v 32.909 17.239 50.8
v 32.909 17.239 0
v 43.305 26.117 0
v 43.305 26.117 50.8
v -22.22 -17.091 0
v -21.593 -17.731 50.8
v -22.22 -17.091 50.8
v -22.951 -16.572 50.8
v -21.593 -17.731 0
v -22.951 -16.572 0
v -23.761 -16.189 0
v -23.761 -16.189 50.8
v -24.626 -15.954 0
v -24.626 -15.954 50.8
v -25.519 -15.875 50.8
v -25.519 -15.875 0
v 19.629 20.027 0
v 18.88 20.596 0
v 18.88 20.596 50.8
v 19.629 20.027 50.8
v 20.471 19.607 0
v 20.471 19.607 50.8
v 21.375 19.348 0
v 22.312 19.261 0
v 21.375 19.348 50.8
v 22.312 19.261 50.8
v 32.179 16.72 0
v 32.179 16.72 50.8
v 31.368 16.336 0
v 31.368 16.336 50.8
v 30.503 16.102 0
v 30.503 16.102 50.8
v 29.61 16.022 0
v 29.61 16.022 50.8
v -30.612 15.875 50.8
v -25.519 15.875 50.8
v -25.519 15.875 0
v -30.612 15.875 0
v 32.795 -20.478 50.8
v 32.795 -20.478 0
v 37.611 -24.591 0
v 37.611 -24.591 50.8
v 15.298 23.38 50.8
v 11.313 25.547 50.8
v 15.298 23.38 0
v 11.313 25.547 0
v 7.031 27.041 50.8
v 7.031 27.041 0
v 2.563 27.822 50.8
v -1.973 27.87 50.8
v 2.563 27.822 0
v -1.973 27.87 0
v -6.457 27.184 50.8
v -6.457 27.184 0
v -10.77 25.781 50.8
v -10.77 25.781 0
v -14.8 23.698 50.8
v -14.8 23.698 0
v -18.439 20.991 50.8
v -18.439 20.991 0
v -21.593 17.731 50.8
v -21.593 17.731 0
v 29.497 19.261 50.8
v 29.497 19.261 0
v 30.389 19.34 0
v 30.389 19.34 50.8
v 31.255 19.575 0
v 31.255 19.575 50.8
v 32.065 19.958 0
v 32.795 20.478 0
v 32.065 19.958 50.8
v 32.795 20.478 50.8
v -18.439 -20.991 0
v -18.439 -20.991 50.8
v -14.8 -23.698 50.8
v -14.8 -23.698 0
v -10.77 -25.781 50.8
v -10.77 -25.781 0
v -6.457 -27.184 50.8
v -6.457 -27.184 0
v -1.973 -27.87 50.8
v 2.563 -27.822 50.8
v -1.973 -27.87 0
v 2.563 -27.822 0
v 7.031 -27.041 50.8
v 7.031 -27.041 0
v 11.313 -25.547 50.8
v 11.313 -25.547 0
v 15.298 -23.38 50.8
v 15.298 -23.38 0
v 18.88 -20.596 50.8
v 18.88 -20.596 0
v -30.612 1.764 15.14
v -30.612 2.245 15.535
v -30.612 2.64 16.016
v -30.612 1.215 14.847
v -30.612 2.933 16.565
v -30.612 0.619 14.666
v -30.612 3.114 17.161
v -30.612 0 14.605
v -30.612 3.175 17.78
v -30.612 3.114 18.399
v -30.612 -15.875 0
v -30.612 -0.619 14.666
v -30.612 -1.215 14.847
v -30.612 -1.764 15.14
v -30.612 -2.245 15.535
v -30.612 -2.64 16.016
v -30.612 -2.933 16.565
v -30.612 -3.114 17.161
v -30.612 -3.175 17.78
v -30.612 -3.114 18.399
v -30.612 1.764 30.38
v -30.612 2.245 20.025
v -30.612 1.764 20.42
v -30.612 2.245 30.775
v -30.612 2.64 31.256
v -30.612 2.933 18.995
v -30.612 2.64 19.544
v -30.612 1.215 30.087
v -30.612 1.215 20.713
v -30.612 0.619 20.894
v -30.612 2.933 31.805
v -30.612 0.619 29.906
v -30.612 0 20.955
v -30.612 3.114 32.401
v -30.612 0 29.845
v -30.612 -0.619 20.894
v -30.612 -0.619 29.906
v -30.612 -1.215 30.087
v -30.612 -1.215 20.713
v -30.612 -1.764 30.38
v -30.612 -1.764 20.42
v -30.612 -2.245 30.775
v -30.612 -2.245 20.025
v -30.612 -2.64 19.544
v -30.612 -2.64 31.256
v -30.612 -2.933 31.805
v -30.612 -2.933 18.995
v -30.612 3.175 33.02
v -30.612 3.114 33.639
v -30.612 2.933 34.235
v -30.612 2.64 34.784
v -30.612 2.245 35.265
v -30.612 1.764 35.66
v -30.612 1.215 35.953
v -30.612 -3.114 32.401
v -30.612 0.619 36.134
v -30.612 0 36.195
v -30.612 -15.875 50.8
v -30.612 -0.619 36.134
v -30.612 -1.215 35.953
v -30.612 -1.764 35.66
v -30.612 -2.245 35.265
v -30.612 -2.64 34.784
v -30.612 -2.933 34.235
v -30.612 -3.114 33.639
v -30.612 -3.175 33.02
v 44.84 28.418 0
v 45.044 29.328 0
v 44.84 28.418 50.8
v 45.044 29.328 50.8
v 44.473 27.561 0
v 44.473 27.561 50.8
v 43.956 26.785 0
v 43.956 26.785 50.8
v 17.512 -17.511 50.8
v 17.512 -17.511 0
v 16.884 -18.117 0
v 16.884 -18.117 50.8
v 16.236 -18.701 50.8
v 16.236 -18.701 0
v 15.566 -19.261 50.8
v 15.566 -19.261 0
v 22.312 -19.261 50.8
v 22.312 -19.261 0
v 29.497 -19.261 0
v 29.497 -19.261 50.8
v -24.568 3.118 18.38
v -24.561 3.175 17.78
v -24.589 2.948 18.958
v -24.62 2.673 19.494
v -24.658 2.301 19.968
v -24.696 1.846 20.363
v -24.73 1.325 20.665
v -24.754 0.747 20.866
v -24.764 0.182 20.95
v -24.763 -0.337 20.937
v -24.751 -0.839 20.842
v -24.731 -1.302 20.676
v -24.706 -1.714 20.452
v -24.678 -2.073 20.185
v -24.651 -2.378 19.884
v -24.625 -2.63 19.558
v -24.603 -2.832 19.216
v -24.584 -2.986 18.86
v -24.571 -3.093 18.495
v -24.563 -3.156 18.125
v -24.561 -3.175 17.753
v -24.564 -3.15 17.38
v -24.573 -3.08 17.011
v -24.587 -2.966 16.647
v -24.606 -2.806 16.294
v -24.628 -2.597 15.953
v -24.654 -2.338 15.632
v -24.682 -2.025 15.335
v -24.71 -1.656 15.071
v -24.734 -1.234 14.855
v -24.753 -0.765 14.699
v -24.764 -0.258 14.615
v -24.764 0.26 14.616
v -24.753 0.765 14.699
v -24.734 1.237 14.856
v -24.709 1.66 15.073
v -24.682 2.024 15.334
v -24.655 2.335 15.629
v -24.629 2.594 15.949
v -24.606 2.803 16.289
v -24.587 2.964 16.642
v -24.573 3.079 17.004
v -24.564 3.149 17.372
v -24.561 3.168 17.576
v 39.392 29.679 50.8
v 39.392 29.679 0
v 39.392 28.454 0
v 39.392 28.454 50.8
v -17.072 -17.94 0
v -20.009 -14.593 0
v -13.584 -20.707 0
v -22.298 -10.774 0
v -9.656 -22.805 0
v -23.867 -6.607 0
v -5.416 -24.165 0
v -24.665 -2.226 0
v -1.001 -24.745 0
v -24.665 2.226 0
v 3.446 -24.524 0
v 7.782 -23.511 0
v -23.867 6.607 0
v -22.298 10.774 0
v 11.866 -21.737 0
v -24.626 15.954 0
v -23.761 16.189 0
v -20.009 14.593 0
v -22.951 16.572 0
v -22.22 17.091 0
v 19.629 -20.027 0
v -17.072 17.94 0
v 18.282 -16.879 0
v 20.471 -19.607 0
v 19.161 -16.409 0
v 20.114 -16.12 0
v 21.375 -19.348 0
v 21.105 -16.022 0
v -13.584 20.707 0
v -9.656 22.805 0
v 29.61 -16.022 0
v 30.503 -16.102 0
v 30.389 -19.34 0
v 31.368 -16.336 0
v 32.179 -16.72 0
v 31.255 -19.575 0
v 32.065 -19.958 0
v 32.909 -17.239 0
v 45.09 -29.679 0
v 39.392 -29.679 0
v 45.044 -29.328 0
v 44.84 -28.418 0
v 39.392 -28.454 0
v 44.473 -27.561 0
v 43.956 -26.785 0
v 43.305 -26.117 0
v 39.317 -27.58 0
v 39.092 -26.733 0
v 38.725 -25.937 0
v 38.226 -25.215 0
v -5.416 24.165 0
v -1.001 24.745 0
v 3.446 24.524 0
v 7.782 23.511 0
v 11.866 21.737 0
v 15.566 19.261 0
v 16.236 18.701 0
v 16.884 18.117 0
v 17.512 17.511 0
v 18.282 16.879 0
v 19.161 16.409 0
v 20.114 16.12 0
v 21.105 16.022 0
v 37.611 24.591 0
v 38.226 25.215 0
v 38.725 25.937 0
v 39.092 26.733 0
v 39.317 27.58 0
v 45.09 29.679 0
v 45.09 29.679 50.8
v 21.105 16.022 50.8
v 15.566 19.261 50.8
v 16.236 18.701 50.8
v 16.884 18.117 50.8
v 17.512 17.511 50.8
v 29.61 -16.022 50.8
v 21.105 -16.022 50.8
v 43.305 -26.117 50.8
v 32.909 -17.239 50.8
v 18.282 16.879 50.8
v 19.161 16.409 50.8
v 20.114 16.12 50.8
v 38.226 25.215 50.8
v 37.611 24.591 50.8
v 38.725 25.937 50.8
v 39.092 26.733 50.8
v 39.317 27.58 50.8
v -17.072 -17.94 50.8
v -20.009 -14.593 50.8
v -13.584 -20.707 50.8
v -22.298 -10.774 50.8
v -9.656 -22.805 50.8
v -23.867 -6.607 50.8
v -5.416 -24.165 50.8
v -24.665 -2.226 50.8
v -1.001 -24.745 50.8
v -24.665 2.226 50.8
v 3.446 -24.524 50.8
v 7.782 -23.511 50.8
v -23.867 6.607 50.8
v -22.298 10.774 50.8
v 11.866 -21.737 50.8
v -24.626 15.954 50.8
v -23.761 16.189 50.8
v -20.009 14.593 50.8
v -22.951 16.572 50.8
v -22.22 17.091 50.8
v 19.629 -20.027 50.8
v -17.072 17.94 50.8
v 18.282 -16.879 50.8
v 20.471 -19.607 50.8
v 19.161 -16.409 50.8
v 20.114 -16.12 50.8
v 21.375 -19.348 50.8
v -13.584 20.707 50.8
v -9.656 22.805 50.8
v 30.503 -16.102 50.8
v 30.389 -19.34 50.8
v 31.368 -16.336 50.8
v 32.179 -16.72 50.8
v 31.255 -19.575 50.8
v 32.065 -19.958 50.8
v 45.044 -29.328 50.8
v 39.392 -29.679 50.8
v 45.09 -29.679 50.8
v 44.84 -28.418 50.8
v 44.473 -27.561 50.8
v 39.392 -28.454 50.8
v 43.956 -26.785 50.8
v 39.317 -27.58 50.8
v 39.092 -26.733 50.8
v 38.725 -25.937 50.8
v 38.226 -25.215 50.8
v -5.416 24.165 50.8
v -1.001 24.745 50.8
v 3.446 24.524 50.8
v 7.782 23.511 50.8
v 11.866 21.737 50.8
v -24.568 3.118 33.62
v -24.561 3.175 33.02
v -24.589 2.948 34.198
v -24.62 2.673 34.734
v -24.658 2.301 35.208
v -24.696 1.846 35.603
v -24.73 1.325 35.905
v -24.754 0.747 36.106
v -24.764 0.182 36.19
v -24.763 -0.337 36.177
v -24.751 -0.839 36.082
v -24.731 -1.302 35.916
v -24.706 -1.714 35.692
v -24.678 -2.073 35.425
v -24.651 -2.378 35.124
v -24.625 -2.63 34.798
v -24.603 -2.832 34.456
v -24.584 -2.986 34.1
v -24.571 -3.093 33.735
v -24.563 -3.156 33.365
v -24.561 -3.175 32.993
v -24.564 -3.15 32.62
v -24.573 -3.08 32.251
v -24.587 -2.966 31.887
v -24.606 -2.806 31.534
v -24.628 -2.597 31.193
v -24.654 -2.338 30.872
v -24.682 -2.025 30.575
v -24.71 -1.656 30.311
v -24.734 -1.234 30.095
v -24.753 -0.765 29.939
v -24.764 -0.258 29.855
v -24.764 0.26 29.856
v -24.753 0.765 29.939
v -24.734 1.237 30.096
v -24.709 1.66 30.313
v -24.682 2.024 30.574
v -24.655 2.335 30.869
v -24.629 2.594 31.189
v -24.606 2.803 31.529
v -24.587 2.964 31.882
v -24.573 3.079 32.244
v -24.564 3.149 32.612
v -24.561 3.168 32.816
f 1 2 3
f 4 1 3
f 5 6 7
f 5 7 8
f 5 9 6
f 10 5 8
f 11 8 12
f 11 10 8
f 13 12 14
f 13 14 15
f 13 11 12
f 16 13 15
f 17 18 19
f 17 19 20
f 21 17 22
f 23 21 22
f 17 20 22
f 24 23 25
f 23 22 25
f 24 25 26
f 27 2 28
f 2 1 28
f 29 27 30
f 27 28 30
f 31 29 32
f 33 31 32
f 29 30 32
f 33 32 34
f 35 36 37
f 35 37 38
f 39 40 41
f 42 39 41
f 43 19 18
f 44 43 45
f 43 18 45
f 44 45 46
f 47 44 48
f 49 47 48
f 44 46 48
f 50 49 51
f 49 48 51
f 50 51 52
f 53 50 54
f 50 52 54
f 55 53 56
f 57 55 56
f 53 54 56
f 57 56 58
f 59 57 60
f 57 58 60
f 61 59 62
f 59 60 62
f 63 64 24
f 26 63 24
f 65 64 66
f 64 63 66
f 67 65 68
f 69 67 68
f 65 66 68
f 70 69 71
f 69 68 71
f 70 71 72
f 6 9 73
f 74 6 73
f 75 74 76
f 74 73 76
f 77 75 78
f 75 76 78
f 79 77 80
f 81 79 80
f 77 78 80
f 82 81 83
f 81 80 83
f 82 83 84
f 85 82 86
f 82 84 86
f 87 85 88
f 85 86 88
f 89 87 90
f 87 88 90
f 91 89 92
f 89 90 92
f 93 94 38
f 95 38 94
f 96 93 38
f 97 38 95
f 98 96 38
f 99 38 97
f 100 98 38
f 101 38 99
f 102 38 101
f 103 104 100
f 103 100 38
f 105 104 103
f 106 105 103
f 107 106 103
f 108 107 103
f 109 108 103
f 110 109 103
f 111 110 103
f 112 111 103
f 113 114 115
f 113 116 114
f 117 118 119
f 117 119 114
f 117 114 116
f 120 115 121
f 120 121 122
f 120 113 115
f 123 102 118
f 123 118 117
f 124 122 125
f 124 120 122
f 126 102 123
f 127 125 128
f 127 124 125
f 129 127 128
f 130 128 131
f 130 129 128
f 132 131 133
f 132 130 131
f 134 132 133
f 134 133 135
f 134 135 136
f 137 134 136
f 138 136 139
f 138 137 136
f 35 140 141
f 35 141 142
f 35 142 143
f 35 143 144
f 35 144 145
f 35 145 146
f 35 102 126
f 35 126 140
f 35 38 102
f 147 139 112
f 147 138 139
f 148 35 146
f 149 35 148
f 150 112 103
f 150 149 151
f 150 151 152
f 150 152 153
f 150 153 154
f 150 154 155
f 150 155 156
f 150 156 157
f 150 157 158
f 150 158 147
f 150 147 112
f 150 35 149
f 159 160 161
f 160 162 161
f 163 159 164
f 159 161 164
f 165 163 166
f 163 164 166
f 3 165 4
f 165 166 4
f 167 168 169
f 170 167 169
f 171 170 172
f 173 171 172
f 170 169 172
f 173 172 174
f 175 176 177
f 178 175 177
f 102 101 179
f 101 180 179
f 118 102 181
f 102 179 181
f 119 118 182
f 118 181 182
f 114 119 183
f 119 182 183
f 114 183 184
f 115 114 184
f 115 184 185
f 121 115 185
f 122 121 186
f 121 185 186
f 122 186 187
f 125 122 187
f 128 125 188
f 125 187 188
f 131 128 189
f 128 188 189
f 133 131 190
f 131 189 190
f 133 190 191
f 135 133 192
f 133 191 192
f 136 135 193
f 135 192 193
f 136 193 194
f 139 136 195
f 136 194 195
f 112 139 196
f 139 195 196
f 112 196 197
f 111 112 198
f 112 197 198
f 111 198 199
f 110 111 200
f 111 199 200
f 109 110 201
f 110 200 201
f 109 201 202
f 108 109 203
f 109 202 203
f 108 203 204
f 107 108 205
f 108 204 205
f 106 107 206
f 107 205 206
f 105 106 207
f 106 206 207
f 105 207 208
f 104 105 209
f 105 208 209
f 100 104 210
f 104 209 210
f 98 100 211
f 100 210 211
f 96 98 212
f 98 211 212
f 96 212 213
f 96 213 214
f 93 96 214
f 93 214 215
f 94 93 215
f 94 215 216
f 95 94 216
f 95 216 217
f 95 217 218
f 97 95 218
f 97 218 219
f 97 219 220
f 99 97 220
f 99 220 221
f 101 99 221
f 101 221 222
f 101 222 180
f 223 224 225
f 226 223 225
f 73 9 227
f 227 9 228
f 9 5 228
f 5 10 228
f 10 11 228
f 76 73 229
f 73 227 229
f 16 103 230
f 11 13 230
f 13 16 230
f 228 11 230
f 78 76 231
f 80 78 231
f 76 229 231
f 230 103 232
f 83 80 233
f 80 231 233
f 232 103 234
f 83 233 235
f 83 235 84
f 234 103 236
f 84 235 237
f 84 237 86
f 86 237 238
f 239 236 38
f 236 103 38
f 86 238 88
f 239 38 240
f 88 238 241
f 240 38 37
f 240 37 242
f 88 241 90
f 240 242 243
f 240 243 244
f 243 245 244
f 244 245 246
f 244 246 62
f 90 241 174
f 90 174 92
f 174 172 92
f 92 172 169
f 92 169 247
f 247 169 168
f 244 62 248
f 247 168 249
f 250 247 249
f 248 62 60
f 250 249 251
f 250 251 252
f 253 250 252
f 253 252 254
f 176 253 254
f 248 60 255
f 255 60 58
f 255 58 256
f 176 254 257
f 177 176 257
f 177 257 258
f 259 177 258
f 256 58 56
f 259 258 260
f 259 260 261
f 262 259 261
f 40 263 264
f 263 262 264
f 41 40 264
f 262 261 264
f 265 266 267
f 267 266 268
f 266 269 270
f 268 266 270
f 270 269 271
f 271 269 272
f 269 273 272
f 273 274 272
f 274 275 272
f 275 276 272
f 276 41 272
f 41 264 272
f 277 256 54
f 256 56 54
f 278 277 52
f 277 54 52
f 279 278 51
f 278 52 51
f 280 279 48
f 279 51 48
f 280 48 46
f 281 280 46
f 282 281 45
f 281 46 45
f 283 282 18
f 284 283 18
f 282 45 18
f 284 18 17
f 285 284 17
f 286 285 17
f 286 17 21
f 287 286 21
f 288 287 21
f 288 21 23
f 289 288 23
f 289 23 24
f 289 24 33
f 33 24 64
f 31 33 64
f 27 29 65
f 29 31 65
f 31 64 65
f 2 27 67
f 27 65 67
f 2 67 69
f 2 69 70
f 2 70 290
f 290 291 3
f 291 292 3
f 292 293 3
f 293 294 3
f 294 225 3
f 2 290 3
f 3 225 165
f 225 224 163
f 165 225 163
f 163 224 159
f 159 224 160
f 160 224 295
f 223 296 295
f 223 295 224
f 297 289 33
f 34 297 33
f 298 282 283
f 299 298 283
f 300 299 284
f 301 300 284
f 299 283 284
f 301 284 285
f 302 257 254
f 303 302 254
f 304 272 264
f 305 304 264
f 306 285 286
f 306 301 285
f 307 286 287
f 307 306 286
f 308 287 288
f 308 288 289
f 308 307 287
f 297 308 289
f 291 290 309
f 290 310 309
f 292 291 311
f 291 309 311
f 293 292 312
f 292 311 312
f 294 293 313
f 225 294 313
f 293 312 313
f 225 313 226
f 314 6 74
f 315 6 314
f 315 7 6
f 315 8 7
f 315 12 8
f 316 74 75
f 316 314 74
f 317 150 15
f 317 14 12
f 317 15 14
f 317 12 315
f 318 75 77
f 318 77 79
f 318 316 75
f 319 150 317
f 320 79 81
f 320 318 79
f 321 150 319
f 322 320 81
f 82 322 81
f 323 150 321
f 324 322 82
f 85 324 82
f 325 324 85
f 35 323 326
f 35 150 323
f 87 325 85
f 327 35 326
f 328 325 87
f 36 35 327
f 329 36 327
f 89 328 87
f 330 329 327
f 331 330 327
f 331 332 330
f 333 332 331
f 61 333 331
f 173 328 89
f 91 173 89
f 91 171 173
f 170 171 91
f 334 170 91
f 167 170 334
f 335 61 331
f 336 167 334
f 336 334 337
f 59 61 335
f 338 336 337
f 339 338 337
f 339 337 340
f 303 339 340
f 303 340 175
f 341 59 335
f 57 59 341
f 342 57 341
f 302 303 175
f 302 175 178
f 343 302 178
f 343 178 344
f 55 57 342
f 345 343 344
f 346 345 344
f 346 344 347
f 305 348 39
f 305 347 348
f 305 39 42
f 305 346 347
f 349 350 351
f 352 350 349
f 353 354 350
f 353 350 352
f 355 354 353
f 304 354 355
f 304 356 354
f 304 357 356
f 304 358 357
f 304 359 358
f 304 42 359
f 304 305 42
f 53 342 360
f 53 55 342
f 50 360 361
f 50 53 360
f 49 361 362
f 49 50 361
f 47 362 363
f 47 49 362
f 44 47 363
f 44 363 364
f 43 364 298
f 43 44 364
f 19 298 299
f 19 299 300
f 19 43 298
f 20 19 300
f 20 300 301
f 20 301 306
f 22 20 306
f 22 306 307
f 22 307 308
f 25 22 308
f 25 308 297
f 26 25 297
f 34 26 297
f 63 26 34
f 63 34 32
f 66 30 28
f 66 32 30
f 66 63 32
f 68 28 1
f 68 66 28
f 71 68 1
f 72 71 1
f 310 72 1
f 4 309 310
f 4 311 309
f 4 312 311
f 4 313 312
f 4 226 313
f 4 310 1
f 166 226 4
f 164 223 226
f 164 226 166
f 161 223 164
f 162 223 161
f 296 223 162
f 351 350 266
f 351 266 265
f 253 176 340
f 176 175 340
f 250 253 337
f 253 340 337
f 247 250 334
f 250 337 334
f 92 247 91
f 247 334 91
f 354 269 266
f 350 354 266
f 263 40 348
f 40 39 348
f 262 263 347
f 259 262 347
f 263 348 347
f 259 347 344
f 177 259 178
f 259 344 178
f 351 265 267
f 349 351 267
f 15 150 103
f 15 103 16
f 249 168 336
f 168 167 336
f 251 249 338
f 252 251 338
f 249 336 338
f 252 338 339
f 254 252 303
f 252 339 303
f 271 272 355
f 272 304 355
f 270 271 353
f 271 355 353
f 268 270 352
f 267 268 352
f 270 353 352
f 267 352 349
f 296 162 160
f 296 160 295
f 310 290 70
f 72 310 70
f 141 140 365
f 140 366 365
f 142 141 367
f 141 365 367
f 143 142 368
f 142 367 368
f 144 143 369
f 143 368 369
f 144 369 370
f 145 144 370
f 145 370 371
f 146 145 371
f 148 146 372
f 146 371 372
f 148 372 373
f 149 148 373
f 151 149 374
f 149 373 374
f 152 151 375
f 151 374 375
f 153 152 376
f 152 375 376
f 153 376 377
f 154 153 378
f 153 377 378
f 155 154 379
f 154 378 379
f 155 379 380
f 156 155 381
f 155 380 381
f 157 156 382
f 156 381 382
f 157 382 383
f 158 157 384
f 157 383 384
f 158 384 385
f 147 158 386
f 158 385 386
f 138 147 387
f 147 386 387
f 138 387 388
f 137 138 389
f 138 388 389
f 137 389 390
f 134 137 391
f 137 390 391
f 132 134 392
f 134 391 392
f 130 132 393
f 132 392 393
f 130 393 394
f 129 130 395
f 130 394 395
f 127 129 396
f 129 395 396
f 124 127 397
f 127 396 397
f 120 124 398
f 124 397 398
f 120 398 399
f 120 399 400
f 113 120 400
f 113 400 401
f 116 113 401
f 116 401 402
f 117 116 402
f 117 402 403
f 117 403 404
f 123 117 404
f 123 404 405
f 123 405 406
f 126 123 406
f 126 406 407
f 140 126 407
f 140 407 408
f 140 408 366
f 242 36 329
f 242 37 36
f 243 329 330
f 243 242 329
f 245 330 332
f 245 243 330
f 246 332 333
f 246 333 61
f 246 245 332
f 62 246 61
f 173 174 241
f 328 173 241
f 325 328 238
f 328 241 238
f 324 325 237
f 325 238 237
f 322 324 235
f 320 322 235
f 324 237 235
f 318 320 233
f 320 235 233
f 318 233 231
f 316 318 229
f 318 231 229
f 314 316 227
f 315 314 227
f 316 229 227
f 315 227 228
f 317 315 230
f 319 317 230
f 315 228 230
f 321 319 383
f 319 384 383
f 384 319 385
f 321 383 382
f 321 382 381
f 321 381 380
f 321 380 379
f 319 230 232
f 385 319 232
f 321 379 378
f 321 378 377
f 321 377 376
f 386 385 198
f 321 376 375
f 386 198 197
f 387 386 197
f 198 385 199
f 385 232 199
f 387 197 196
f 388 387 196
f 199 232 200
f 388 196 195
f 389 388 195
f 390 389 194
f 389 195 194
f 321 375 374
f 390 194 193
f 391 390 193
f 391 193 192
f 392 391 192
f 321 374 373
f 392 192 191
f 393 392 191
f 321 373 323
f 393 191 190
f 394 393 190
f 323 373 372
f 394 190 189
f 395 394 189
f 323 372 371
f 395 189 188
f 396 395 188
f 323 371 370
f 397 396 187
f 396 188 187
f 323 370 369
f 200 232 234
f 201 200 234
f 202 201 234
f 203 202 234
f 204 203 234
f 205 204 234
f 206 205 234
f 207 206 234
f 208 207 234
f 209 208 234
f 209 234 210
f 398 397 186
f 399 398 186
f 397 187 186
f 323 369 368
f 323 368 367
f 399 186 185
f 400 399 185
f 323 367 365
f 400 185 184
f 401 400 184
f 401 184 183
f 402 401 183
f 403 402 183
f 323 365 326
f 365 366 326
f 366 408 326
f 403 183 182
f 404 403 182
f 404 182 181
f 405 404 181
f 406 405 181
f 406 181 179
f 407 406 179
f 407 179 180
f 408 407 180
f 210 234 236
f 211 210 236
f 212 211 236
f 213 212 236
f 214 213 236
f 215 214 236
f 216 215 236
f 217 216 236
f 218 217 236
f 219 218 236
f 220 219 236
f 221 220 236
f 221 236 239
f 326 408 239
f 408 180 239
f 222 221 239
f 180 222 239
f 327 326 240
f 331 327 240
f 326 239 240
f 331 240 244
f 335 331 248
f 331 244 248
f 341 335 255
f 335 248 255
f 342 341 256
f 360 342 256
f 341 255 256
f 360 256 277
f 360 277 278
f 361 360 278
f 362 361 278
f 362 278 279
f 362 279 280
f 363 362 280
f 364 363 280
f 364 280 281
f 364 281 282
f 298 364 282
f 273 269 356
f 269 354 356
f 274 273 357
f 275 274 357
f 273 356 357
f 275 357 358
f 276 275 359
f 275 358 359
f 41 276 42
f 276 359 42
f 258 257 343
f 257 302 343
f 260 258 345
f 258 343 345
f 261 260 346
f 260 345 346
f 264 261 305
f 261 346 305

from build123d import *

# Parameters (mm, degrees)
F1_DEPTH = 50.8
F2_R     = 3.175
F3_DEPTH = 127
F5_DEPTH = 50.8
F6_DEPTH = 279.4
F7_R     = 5.08


with BuildPart() as f1:
    # F0 (on Top) → F1 (new body)
    with BuildSketch(Plane.XY):
        with BuildLine():
            ThreePointArc((20.2399183732, 19.2610826343), (21.625356316, 17.6914545532), (22.8893718502, 16.0224922001))
            Line((22.8893718502, 16.0224922001), (31.4840450883, 16.0224922001))
            Line((31.4840450883, 16.0224922001), (44.7927798103, 27.3874809633))
            Line((44.7927798103, 27.3874809633), (45.0897253182, 29.6793562902))
            Line((45.0897253182, 29.6793562902), (39.3924824893, 29.6793562902))
            Line((39.3924824893, 29.6793562902), (39.3924824893, 26.1115133762))
            Line((39.3924824893, 26.1115133762), (31.3704274416, 19.2610826343))
            Line((31.3704274416, 19.2610826343), (20.2399183732, 19.2610826343))
        make_face()
        with BuildLine():
            Line((31.4840450883, -16.0224922001), (22.8893718502, -16.0224922001))
            ThreePointArc((22.8893718502, -16.0224922001), (21.625356316, -17.6914545532), (20.2399183732, -19.2610826343))
            Line((20.2399183732, -19.2610826343), (31.3704274416, -19.2610826343))
            Line((31.3704274416, -19.2610826343), (39.3924824893, -26.1115133762))
            Line((39.3924824893, -26.1115133762), (39.3924824893, -29.6793562902))
            Line((39.3924824893, -29.6793562902), (45.0897253182, -29.6793562902))
            Line((45.0897253182, -29.6793562902), (44.7927798103, -27.3874809633))
            Line((44.7927798103, -27.3874809633), (31.4840450883, -16.0224922001))
        make_face()
        with BuildLine():
            ThreePointArc((15.5664999519, -19.2610826343), (-24.765, 0), (15.5664999519, 19.2610826343))
            Line((15.5664999519, 19.2610826343), (20.2399183732, 19.2610826343))
            ThreePointArc((20.2399183732, 19.2610826343), (-27.94, 0), (20.2399183732, -19.2610826343))
            Line((20.2399183732, -19.2610826343), (15.5664999519, -19.2610826343))
        make_face()
        with BuildLine():
            ThreePointArc((15.5664999519, 19.2610826343), (17.3009251144, 17.7195715294), (18.8834575408, 16.0224922001))
            Line((18.8834575408, 16.0224922001), (22.8893718502, 16.0224922001))
            ThreePointArc((22.8893718502, 16.0224922001), (21.625356316, 17.6914545532), (20.2399183732, 19.2610826343))
            Line((20.2399183732, 19.2610826343), (15.5664999519, 19.2610826343))
        make_face()
        with BuildLine():
            Line((22.8893718502, -16.0224922001), (18.8834575408, -16.0224922001))
            ThreePointArc((18.8834575408, -16.0224922001), (17.3009251144, -17.7195715294), (15.5664999519, -19.2610826343))
            Line((15.5664999519, -19.2610826343), (20.2399183732, -19.2610826343))
            ThreePointArc((20.2399183732, -19.2610826343), (21.625356316, -17.6914545532), (22.8893718502, -16.0224922001))
        make_face()
    extrude(amount=F1_DEPTH)

    # F2 (on Right) → F3 (cut)
    with BuildSketch(Plane.YZ):
        with Locations((0, 33.02)):
            Circle(F2_R)
        with Locations((0, 17.78)):
            Circle(F2_R)
    extrude(amount=-F3_DEPTH, mode=Mode.SUBTRACT)

    # F4 (on face) → F5 (join)
    with BuildSketch(Plane.XY.offset(50.8)):
        Polygon((-26.6156196594, 0), (-22.9919110776, 15.875), (-30.6119110776, 15.875), (-30.6119110776, -15.875), (-22.9919110776, -15.875), align=None)
    extrude(amount=-F5_DEPTH)

    # F2 (on Right) → F6 (cut)
    with BuildSketch(Plane.YZ):
        with Locations((0, 33.02)):
            Circle(F2_R)
        with Locations((0, 17.78)):
            Circle(F2_R)
    extrude(amount=-F6_DEPTH, mode=Mode.SUBTRACT)

    # F7
    f7_edges = [f1.edges().sort_by_distance(p)[0] for p in [
        (-22.991911, 15.875, 25.4),
        (-22.991911, -15.875, 25.4),
        (20.239918, -19.261083, 25.4),
        (31.370427, -19.261083, 25.4),
        (39.392482, -26.111513, 25.4),
        (31.484045, -16.022492, 25.4),
        (18.883458, -16.022492, 25.4),
        (44.79278, -27.387481, 25.4),
        (44.79278, 27.387481, 25.4),
        (31.484045, 16.022492, 25.4),
        (31.370427, 19.261083, 25.4),
        (39.392482, 26.111513, 25.4),
        (20.239918, 19.261083, 25.4),
        (18.883458, 16.022492, 25.4),
    ]]
    fillet(f7_edges, radius=F7_R)


solid = f1.part
